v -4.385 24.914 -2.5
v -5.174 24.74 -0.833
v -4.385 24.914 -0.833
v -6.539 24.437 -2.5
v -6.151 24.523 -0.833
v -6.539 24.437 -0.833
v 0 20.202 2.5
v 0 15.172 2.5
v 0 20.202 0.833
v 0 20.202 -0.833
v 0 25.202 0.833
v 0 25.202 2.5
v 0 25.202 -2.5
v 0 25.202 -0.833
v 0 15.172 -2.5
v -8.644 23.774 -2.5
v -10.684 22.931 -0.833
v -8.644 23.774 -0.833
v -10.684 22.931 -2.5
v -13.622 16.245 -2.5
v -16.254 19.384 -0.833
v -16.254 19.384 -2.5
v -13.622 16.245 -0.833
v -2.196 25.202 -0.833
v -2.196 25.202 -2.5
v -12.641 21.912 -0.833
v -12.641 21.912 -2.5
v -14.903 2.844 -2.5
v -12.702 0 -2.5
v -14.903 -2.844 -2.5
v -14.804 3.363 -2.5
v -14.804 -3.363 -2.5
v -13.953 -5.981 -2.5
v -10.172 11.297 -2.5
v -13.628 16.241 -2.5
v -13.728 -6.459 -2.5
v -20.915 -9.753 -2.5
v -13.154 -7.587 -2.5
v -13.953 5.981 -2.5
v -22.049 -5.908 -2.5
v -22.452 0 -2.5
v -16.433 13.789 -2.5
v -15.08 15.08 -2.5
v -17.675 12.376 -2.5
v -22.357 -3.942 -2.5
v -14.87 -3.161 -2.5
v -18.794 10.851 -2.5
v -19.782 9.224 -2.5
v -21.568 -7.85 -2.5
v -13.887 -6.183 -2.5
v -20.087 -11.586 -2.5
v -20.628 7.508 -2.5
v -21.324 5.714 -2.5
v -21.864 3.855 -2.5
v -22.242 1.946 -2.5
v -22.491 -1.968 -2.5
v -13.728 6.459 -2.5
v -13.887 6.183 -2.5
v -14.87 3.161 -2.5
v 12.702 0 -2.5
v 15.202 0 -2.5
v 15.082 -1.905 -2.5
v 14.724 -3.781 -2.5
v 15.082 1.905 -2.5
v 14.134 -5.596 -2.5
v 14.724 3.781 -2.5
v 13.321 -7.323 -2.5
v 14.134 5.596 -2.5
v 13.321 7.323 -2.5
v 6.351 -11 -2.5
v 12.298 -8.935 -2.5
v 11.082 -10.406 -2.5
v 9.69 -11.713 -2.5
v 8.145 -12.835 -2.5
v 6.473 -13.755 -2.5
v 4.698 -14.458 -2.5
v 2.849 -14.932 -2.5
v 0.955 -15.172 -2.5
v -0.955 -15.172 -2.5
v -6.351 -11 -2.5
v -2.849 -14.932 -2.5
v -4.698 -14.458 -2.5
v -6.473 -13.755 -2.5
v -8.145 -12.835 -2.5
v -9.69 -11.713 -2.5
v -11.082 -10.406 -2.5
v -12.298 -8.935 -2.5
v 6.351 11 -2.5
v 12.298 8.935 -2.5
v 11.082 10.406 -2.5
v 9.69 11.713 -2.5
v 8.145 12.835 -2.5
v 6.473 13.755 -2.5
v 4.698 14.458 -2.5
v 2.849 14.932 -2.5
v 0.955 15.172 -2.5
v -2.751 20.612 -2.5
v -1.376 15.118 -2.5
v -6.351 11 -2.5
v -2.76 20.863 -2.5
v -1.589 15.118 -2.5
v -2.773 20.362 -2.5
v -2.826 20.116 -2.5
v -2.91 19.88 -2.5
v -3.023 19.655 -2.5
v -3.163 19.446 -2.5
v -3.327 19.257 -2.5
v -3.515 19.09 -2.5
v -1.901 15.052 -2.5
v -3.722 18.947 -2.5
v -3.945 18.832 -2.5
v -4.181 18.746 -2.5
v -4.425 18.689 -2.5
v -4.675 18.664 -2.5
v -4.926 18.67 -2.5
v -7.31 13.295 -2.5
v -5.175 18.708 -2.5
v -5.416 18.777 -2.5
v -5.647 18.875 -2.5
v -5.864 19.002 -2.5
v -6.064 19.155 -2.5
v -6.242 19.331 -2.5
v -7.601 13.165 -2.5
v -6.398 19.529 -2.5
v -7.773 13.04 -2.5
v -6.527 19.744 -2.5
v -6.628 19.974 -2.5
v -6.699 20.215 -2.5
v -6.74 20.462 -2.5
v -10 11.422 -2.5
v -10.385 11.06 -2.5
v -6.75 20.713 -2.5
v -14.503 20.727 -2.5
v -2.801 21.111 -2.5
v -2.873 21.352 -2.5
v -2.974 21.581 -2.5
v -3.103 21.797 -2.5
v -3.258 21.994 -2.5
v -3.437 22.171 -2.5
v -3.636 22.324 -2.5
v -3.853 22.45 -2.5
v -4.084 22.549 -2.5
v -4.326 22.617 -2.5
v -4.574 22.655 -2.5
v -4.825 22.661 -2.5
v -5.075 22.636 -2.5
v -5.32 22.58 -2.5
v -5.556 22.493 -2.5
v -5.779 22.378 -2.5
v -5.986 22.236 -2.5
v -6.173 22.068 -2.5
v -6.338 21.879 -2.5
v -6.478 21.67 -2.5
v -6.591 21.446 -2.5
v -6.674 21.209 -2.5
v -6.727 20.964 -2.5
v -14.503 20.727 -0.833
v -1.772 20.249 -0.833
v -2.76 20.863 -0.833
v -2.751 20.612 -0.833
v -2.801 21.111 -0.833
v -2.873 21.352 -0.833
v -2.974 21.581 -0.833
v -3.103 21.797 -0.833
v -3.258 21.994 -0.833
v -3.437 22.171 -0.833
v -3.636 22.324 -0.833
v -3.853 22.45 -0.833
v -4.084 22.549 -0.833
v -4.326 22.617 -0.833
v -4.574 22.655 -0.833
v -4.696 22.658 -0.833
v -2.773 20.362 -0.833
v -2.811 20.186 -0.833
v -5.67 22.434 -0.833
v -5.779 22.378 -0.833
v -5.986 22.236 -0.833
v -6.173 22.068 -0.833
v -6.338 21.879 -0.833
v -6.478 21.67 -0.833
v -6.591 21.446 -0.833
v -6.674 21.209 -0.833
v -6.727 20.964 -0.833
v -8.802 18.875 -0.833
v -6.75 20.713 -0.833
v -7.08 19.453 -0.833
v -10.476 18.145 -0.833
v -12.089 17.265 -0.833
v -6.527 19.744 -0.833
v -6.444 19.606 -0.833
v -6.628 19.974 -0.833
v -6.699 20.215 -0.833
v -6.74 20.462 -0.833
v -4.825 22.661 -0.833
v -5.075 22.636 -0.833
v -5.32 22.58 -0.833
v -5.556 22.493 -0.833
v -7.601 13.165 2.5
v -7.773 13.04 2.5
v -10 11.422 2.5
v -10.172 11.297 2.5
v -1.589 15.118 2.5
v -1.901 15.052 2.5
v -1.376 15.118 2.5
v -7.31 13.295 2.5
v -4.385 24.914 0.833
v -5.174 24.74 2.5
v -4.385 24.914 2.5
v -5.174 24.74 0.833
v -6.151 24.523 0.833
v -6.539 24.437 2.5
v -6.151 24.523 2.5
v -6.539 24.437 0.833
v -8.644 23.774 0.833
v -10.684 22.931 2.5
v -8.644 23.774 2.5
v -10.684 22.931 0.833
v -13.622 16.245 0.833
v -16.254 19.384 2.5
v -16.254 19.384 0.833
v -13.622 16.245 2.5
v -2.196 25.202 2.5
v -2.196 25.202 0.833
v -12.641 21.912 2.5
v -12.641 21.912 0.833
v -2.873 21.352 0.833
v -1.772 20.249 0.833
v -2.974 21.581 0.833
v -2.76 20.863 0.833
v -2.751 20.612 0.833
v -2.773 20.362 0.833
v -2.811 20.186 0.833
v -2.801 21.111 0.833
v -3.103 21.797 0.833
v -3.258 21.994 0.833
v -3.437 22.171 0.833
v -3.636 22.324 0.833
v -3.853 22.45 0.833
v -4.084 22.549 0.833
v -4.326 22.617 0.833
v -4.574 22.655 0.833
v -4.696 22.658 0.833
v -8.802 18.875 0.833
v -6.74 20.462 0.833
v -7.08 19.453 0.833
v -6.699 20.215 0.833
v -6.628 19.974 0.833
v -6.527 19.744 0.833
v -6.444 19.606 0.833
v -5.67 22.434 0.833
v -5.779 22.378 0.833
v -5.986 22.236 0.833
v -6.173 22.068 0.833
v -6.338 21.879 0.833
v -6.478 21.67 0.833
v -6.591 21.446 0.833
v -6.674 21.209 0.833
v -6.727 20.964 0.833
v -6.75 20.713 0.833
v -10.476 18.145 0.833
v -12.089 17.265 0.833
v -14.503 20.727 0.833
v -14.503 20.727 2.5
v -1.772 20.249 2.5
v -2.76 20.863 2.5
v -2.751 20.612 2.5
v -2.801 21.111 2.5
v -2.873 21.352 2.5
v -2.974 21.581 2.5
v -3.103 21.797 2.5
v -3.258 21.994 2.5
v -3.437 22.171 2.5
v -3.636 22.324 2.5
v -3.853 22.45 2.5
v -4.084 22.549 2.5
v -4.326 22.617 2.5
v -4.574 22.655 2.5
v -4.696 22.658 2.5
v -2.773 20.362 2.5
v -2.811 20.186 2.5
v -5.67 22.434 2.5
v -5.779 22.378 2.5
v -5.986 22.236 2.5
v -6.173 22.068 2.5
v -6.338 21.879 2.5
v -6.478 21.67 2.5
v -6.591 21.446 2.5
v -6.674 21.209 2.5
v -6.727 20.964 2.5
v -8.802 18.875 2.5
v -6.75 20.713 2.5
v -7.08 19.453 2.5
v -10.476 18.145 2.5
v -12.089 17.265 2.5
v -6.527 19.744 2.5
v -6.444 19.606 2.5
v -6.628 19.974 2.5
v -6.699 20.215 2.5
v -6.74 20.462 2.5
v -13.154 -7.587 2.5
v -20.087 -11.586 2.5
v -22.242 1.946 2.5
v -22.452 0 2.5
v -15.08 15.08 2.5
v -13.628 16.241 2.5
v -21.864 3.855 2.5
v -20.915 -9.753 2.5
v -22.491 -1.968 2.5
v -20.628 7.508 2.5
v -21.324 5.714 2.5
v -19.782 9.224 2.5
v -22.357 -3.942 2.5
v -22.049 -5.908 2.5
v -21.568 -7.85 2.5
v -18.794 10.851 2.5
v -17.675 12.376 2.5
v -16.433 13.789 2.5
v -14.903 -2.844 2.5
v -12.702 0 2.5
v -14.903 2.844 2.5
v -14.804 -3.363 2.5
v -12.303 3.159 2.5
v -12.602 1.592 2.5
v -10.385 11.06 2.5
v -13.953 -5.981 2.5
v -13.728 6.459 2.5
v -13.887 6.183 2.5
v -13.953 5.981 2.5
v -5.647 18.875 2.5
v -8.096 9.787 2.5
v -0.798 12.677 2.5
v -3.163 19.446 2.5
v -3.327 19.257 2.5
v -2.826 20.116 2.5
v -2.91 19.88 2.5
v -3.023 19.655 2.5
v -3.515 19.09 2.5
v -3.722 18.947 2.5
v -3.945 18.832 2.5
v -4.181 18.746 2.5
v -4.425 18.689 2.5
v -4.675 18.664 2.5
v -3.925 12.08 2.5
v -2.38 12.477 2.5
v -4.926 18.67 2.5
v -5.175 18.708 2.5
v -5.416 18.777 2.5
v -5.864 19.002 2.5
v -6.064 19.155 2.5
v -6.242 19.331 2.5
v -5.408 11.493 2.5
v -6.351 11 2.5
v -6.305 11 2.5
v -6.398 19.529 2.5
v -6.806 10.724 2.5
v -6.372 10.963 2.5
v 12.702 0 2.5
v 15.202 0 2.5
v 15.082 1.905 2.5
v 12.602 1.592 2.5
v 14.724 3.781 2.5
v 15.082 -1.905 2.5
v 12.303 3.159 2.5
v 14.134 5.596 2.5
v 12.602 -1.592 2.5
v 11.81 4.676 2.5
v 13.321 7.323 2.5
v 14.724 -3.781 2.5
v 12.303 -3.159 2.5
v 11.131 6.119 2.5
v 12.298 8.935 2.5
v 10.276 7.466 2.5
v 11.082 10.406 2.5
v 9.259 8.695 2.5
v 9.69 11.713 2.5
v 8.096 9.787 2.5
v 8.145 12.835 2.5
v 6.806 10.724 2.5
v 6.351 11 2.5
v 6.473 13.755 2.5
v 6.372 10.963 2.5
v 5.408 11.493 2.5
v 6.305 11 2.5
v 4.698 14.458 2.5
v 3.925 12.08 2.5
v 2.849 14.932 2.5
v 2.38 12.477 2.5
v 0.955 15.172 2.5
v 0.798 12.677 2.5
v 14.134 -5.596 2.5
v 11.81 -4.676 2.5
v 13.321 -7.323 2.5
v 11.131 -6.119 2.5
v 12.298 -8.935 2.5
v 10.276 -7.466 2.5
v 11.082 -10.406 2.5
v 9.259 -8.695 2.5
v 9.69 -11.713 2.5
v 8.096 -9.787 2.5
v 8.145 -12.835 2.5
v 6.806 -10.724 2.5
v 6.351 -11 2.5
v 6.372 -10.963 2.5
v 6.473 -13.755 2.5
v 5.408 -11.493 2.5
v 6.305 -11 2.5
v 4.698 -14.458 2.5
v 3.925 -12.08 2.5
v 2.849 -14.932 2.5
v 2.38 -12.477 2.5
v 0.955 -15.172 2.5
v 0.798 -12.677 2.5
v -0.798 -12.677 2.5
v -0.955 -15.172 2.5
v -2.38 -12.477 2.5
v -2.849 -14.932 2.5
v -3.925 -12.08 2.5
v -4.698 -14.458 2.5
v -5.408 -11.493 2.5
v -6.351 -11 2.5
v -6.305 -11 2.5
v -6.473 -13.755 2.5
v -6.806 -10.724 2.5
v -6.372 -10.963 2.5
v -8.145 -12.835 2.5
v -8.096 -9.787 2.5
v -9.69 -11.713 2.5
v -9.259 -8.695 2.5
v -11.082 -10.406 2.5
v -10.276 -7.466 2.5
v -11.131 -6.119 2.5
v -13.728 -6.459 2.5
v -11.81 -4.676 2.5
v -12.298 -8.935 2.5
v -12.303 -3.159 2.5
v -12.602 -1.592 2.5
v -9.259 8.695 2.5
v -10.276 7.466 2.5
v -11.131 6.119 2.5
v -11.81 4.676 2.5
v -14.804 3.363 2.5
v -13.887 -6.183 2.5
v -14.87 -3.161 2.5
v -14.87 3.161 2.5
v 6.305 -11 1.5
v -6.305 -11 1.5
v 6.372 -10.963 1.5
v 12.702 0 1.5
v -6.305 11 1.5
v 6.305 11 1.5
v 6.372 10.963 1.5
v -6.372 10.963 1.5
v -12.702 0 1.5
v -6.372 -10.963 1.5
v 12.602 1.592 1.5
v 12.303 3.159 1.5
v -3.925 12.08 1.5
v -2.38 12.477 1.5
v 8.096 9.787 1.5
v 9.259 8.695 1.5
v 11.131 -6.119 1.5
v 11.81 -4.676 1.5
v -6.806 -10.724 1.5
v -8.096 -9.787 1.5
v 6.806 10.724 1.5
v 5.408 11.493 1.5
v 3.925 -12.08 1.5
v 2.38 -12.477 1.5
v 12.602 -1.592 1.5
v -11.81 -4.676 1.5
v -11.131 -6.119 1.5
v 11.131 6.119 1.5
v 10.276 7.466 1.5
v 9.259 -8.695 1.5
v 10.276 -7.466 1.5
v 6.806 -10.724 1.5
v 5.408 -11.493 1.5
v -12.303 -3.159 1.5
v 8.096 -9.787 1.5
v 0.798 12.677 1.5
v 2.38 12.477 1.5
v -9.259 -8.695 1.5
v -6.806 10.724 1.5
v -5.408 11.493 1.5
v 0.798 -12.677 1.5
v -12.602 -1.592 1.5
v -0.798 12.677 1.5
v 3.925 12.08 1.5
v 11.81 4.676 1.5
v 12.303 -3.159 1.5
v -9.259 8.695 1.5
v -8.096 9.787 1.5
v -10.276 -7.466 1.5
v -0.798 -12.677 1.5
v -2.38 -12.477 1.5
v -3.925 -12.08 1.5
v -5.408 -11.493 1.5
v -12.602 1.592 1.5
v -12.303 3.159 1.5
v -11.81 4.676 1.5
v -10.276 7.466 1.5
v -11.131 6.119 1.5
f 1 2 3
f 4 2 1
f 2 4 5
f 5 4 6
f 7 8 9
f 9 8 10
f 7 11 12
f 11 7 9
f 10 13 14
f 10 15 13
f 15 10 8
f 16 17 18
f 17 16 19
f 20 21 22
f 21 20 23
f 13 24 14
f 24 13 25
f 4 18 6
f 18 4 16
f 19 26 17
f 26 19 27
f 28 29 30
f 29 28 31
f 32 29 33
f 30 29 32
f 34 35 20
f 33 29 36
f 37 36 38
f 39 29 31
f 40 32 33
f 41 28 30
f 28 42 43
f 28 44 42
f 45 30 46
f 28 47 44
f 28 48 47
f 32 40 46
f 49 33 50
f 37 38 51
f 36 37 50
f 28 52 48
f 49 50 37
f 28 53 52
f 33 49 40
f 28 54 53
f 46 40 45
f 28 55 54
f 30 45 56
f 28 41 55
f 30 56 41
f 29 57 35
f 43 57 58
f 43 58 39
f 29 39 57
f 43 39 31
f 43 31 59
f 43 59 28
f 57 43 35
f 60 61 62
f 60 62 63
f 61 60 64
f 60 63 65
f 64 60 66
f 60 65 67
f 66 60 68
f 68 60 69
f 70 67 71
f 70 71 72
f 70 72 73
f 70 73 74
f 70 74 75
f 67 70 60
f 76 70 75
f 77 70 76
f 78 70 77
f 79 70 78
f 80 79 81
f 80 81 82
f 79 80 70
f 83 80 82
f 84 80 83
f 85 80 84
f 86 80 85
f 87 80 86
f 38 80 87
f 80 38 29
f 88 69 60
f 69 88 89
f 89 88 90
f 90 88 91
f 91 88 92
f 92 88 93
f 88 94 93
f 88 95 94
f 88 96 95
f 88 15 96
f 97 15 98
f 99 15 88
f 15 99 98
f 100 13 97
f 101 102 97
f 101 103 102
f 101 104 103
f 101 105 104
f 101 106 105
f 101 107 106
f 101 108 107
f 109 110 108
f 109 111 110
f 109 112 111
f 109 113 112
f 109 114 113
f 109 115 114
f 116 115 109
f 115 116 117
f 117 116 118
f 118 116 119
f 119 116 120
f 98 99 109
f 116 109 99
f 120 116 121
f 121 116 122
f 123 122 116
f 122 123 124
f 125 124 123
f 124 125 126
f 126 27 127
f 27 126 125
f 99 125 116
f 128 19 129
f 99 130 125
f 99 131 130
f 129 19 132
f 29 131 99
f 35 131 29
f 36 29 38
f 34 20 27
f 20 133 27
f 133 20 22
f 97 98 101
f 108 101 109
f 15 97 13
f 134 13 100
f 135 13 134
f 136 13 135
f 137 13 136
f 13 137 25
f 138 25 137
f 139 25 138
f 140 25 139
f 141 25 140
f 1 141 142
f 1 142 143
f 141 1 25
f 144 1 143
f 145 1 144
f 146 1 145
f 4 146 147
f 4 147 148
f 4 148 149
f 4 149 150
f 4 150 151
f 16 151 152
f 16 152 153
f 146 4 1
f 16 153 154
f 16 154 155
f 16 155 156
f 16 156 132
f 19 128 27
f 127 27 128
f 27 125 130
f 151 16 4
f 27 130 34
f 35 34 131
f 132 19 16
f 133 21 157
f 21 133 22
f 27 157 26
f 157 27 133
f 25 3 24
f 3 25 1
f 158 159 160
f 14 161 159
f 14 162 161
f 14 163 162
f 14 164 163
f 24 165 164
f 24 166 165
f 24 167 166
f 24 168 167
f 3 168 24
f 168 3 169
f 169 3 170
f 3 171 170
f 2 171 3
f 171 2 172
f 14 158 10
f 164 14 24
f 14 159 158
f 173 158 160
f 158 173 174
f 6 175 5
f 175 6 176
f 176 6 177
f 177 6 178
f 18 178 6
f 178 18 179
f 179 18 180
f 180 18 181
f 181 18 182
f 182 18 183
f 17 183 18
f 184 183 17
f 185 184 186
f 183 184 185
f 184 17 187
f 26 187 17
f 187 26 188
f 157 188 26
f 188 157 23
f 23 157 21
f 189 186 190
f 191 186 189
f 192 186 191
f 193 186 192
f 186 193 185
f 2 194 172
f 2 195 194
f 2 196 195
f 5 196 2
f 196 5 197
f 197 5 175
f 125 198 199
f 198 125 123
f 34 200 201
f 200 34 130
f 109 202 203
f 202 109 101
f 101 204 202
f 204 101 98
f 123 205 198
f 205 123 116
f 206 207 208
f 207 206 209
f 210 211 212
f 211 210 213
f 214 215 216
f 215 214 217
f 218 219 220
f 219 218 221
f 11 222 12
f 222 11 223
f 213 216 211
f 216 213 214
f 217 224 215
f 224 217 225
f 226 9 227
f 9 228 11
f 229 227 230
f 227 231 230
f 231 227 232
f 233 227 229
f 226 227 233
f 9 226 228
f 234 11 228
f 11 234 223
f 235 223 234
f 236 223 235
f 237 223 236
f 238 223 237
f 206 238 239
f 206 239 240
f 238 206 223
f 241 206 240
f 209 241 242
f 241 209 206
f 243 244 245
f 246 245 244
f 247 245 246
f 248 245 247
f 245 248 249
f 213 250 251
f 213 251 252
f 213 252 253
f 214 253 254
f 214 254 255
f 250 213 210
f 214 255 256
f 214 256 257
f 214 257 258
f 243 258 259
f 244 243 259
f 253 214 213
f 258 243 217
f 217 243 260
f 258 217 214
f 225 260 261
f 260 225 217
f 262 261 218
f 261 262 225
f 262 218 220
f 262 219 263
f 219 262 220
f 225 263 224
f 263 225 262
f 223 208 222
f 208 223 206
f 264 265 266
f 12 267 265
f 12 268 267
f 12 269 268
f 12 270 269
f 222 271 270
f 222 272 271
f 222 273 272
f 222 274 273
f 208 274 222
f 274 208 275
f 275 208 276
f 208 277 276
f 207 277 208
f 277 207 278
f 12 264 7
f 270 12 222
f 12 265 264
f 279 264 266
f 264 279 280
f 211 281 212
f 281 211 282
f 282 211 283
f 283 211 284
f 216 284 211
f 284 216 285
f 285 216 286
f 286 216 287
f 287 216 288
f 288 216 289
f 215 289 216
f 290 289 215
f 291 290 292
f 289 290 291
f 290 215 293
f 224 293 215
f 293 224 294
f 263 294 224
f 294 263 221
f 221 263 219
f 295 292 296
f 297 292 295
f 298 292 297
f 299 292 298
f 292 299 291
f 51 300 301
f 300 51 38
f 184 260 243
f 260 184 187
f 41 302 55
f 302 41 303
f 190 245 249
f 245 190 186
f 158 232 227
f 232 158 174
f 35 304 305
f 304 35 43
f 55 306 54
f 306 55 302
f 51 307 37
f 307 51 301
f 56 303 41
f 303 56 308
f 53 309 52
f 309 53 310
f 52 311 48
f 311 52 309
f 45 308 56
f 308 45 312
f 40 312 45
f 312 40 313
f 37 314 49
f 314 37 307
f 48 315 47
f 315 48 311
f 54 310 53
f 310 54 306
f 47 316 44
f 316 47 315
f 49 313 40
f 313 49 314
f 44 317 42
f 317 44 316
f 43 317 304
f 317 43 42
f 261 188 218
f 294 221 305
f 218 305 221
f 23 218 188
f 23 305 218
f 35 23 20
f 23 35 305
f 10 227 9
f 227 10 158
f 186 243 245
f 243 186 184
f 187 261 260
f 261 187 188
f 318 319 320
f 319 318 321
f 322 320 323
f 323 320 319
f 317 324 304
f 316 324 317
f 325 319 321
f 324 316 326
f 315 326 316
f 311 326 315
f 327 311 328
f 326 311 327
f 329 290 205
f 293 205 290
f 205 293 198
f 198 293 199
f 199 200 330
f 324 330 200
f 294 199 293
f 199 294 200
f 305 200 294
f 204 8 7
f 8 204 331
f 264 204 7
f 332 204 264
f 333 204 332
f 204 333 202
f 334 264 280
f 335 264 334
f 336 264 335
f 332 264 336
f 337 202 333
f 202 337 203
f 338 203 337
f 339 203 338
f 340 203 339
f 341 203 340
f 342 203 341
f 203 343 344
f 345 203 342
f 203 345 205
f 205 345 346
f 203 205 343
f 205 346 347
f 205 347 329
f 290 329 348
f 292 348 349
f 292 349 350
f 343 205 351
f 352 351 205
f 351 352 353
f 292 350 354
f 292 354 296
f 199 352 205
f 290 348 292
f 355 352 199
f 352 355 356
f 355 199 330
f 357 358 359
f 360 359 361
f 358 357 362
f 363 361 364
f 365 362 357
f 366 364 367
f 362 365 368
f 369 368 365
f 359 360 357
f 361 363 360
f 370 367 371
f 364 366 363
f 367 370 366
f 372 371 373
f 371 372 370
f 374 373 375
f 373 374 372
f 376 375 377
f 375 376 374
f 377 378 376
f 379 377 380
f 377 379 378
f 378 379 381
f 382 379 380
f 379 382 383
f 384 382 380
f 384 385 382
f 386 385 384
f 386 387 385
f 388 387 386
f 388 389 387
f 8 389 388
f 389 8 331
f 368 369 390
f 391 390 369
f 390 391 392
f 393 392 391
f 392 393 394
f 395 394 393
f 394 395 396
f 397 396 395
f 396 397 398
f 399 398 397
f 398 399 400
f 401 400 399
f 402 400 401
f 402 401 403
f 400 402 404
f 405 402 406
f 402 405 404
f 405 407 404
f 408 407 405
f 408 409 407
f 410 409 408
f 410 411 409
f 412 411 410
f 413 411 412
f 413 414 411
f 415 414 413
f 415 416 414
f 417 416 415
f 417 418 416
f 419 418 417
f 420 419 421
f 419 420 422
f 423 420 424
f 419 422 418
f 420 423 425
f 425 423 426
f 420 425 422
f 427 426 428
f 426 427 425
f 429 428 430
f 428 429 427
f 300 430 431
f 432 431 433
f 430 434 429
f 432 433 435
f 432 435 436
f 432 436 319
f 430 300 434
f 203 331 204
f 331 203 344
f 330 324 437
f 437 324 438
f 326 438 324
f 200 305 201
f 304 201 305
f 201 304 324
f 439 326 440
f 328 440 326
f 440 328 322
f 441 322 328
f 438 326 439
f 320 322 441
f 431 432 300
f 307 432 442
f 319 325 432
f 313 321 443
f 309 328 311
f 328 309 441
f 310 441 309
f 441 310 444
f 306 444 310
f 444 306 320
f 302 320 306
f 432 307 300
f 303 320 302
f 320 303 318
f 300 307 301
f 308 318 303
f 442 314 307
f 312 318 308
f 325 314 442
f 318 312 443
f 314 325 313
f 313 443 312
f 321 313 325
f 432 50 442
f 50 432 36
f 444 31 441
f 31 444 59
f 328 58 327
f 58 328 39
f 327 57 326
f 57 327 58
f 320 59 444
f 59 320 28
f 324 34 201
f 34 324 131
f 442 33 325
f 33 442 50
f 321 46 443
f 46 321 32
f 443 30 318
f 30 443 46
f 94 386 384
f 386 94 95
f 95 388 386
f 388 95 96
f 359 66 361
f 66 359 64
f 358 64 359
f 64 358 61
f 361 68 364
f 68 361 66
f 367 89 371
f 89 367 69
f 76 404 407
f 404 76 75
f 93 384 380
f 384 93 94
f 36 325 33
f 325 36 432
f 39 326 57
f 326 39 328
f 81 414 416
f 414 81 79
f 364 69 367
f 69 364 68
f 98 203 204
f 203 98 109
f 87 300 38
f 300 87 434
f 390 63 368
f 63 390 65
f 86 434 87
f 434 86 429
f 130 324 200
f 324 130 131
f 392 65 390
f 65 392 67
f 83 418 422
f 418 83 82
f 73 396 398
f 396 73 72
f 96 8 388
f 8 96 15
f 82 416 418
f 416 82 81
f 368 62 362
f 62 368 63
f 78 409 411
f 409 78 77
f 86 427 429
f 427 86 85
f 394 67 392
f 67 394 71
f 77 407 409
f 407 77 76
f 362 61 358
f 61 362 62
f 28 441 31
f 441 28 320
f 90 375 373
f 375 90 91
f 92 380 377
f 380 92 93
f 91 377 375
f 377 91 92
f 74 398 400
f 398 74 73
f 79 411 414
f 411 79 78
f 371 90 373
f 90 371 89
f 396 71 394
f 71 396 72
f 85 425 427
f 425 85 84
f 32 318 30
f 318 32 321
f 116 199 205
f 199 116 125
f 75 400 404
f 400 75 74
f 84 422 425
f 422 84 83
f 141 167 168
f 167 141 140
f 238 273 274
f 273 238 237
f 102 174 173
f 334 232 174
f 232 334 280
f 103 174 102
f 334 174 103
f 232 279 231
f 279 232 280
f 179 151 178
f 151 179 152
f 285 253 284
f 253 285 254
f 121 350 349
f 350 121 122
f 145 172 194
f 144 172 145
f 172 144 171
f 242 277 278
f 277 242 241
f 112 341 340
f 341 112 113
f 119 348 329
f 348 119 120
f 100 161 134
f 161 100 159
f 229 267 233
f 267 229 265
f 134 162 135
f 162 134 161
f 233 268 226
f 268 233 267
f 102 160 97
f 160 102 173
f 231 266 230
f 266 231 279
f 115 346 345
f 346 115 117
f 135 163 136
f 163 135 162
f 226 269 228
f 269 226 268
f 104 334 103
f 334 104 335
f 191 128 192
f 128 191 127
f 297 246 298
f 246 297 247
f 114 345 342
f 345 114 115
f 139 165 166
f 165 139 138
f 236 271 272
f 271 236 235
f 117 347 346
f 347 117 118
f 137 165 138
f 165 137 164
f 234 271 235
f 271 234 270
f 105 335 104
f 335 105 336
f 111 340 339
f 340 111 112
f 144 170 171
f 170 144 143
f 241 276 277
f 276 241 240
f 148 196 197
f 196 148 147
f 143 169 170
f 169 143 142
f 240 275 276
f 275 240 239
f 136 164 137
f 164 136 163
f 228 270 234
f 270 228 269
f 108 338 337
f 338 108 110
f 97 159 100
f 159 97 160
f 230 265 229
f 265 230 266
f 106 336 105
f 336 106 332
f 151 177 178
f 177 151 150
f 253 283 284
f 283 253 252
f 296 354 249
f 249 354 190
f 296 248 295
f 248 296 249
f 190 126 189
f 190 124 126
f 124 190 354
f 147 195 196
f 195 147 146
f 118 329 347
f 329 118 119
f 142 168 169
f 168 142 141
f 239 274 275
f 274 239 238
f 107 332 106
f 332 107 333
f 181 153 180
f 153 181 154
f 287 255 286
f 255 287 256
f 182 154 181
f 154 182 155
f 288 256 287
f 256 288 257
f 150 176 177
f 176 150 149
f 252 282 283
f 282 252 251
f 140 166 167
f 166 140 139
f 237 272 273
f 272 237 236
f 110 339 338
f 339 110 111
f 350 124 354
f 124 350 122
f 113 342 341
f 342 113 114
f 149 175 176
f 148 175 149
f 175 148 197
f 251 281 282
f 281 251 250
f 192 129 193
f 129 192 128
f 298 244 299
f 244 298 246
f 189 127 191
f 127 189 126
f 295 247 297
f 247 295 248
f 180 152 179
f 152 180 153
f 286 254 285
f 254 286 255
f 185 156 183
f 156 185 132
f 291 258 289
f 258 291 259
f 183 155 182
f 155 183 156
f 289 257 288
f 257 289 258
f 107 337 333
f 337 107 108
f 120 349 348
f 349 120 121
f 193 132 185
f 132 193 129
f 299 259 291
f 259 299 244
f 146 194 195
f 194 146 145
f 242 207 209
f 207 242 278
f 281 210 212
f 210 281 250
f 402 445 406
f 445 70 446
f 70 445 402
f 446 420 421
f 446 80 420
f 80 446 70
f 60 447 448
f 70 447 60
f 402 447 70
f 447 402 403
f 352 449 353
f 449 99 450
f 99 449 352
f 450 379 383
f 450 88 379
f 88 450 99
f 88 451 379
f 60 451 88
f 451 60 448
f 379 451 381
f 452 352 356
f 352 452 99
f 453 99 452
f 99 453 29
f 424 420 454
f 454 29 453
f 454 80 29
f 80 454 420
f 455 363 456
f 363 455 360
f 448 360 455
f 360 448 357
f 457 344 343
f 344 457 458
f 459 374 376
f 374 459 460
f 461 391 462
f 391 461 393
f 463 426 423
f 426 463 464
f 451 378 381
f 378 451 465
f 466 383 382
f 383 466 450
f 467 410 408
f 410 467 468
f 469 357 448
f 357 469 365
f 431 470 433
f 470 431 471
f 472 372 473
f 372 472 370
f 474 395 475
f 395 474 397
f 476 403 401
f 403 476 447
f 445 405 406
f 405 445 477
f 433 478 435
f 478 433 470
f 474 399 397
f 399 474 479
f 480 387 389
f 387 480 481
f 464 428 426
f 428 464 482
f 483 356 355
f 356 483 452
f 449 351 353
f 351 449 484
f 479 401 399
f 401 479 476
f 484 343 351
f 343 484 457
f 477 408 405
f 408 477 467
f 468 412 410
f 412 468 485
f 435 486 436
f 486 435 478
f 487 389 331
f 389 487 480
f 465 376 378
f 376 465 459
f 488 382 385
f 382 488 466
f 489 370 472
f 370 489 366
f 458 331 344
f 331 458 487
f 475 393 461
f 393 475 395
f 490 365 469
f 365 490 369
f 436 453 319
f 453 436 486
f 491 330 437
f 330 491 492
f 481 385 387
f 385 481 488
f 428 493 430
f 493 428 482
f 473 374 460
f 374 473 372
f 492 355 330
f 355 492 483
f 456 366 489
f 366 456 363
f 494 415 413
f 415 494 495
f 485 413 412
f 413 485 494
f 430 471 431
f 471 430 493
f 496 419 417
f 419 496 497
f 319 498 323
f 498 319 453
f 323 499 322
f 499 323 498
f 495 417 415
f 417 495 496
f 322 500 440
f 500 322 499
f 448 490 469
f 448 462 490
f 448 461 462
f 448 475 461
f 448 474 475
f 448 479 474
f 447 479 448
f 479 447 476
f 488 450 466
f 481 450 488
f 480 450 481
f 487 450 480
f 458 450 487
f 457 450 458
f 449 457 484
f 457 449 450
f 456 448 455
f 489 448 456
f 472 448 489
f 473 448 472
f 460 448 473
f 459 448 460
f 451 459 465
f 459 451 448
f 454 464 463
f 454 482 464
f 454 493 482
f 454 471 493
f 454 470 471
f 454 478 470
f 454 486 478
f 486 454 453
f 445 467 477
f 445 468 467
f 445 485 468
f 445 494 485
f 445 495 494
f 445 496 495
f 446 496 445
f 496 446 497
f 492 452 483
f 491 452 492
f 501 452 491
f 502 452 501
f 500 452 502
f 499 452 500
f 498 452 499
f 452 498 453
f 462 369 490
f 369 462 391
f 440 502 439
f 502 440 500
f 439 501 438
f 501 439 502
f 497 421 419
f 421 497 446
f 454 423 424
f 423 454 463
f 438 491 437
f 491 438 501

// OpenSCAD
// OpenSCAD version 2021.01
// Throttle CAM
// Simon Pilepich 2021-10-02

hex = 22;
hex_od = hex / 2 / sin(30) / sin(60);  echo("Hex OD=",hex_od);
// Calculate diameter for nut
t = 5;
thickness = t;
res = 50;
circle_resoluition = res;
min_diamater = hex_od + 5;
step=1;
start_height = 05;
end_height = 8;
degrees = 120;
cable_diameter = 1;
cable_end_diameter = 4;
guide_length = .3; // 70%


main();


module cam(start_height, end_height, degrees, thickness = t) {
    A=5;
    step=(end_height-start_height)/degrees;
    translate([0,0,-t/2]) difference() {
        hull() {
            for(i=[0:A:degrees-1]) {
                h1=min_diamater/2+start_height+i*step;
                h2=min_diamater/2+start_height+(i+1)*step;
                c_over_sin_C=h1/sin(90);
                width=c_over_sin_C*sin(A);
                b=sqrt(pow(h1,2)-pow(width,2))-(start_height-end_height)*(i/120);
                rotate([0,270,i]) {
                    wedge(thickness,h1,h2,width);
                    // polyhedron(
                    //     points=[
                    //     [0,0,0], //0
                    //     [t,0,0], //1
                    //     [t,h1,0], //2
                    //     [0,h1,0], //3
                    //     [0,h2,a], //4
                    //     [t,h2,a]], //5
                    //     faces=[
                    //     [0,1,2,3], //A
                    //     [5,4,3,2], //B
                    //     [0,4,5,1], //C
                    //     [0,3,4],  //D
                    //     [5,2,1]]); //E
                }
            }
        }
        cylinder(d=min_diamater, h=t);
    }
}

module wedge(t,h1,h2,width) {
    polyhedron(
        points=[
            [0,0,0], //0
            [t,0,0], //1
            [t,h1,0], //2
            [0,h1,0], //3
            [0,h2,width], //4
            [t,h2,width]], //5
            faces=[
            [0,1,2,3], //A
            [5,4,3,2], //B
            [0,4,5,1], //C
            [0,3,4],  //D
            [5,2,1]
        ]
    ); //E
}


module guide(height, angle) {
    cam(height, height, angle, thickness/3);
    translate([0,0,thickness*2/3])cam(height, height, angle, thickness/3);
}


module main() {
    difference() {
        union() {
            cylinder(d = min_diamater, h = t, center = true, $fn = res);
            guide(height=start_height+5,angle=degrees*guide_length);
            cam(start_height, end_height, degrees);
        }
        // hex
        cylinder(d = hex_od, h = t, center = true, $fn = 6);
         // step
        translate([ 0, 0, t / 2 - step ]) cylinder(d = hex_od, h = t, $fn = res);
        a = 360 / ((min_diamater + start_height) * PI / (cable_end_diameter)) ;
        echo(str("Variable = ", a));
        rotate([0,0,a]) translate([0,min_diamater/2+start_height+cable_diameter,-t/2]) 
            {
                cylinder(d=cable_end_diameter, h=t, $fn = res);
                translate([-cable_diameter/2,0,t/3]) cube([cable_diameter,10,5]);
            }   
    }
}
